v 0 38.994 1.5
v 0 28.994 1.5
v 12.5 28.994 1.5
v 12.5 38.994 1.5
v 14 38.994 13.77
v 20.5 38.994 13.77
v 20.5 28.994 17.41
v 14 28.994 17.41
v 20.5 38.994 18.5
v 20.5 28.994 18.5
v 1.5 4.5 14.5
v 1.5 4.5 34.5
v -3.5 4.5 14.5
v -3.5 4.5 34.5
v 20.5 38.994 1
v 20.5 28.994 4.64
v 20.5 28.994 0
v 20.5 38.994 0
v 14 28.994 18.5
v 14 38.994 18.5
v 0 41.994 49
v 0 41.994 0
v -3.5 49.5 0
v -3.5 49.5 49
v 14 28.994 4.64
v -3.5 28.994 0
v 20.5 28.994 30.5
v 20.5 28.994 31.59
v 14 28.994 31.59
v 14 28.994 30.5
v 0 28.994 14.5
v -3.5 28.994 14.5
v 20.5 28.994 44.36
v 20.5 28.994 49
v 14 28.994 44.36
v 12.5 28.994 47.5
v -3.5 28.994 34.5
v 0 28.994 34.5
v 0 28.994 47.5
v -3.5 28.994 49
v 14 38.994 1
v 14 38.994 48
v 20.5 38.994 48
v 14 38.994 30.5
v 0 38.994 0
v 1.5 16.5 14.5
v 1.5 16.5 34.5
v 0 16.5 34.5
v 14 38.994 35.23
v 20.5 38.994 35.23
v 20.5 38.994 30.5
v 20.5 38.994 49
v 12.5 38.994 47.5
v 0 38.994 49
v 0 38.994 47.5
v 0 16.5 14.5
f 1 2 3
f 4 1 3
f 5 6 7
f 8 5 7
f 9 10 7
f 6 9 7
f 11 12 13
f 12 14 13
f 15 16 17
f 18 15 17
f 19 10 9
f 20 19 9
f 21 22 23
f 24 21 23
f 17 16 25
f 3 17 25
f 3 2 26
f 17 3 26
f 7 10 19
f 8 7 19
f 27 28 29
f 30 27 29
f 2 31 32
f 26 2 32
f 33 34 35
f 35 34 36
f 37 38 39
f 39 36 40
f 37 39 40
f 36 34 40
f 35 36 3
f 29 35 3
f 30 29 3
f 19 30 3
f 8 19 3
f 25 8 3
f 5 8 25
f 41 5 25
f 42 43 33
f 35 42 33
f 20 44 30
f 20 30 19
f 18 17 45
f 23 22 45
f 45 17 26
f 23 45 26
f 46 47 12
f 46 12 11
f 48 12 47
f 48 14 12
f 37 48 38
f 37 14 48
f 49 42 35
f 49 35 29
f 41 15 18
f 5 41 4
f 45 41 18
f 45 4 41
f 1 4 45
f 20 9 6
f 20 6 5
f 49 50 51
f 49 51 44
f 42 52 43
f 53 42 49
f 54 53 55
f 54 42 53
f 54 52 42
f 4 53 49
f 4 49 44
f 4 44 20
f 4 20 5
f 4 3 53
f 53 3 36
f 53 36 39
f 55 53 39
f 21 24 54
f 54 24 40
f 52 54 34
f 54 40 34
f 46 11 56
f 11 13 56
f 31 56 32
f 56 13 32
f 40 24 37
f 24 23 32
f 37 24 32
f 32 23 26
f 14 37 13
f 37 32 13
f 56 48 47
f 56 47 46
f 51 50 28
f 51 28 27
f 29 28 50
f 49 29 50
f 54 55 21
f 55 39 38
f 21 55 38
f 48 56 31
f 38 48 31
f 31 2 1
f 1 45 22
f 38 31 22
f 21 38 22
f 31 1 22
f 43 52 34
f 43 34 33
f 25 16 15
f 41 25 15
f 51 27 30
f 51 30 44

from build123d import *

# Parameters (mm, degrees)
SALIENTE_EXTRUIR1_DEPTH = 49
CORTAR_EXTRUIR1_DEPTH   = 70.738798384
SALIENTE_EXTRUIR3_DEPTH = 10
CROQUIS8_W              = 12
CROQUIS8_H              = 10
CORTAR_EXTRUIR2_DEPTH   = 6.5
CROQUIS9_W              = 20
CROQUIS9_H              = 12
SALIENTE_EXTRUIR4_DEPTH = 1.5


with BuildPart() as part:
    # Croquis1 → Saliente-Extruir1 (new body)
    with BuildSketch(Plane.XY):
        Polygon((-3.5, 49.5), (-3.5, 0), (0, 0), (0, 41.994225778), align=None)
    extrude(amount=SALIENTE_EXTRUIR1_DEPTH)

    # Croquis2 → Cortar-Extruir1 (cut, through all)
    with BuildSketch(Plane(origin=(0, 0, 0), x_dir=(0, 0, -1), z_dir=(1, 0, 0))):
        Polygon((-49, 0), (0, 0), (0, 28.994225778), (-14.5, 28.994225778), (-14.5, 4.5), (-34.5, 4.5), (-34.5, 28.994225778), (-49, 28.994225778), align=None)
    extrude(amount=-CORTAR_EXTRUIR1_DEPTH, mode=Mode.SUBTRACT)

    # Croquis4 → Saliente-Extruir3 (add)
    with BuildSketch(Plane.XZ.offset(-28.994225778)):
        Polygon((0, 49), (20.5, 49), (20.5, 0), (0, 0), (0, 1.5), (12.5, 1.5), (12.5, 47.5), (0, 47.5), align=None)
    extrude(amount=-SALIENTE_EXTRUIR3_DEPTH)

    # Croquis8 → Cortar-Extruir2 (cut)
    with BuildSketch(Plane(origin=(20.5, 0, 0), x_dir=(0, 0, -1), z_dir=(1, 0, 0))):
        with Locations((-24.5, 33.994225778)):
            Rectangle(CROQUIS8_W, CROQUIS8_H)
        Polygon((-48, 38.994225778), (-44.360297657, 28.994225778), (-31.590164388, 28.994225778), (-35.22986673, 38.994225778), align=None)
        Polygon((-17.409835612, 28.994225778), (-4.639702343, 28.994225778), (-1, 38.994225778), (-13.77013327, 38.994225778), align=None)
    extrude(amount=-CORTAR_EXTRUIR2_DEPTH, mode=Mode.SUBTRACT)

    # Croquis9 → Saliente-Extruir4 (add)
    with BuildSketch(Plane(origin=(0, 0, 0), x_dir=(0, 0, -1), z_dir=(1, 0, 0))):
        with Locations((-24.5, 10.5)):
            Rectangle(CROQUIS9_W, CROQUIS9_H)
    extrude(amount=SALIENTE_EXTRUIR4_DEPTH)


solid = part.part
